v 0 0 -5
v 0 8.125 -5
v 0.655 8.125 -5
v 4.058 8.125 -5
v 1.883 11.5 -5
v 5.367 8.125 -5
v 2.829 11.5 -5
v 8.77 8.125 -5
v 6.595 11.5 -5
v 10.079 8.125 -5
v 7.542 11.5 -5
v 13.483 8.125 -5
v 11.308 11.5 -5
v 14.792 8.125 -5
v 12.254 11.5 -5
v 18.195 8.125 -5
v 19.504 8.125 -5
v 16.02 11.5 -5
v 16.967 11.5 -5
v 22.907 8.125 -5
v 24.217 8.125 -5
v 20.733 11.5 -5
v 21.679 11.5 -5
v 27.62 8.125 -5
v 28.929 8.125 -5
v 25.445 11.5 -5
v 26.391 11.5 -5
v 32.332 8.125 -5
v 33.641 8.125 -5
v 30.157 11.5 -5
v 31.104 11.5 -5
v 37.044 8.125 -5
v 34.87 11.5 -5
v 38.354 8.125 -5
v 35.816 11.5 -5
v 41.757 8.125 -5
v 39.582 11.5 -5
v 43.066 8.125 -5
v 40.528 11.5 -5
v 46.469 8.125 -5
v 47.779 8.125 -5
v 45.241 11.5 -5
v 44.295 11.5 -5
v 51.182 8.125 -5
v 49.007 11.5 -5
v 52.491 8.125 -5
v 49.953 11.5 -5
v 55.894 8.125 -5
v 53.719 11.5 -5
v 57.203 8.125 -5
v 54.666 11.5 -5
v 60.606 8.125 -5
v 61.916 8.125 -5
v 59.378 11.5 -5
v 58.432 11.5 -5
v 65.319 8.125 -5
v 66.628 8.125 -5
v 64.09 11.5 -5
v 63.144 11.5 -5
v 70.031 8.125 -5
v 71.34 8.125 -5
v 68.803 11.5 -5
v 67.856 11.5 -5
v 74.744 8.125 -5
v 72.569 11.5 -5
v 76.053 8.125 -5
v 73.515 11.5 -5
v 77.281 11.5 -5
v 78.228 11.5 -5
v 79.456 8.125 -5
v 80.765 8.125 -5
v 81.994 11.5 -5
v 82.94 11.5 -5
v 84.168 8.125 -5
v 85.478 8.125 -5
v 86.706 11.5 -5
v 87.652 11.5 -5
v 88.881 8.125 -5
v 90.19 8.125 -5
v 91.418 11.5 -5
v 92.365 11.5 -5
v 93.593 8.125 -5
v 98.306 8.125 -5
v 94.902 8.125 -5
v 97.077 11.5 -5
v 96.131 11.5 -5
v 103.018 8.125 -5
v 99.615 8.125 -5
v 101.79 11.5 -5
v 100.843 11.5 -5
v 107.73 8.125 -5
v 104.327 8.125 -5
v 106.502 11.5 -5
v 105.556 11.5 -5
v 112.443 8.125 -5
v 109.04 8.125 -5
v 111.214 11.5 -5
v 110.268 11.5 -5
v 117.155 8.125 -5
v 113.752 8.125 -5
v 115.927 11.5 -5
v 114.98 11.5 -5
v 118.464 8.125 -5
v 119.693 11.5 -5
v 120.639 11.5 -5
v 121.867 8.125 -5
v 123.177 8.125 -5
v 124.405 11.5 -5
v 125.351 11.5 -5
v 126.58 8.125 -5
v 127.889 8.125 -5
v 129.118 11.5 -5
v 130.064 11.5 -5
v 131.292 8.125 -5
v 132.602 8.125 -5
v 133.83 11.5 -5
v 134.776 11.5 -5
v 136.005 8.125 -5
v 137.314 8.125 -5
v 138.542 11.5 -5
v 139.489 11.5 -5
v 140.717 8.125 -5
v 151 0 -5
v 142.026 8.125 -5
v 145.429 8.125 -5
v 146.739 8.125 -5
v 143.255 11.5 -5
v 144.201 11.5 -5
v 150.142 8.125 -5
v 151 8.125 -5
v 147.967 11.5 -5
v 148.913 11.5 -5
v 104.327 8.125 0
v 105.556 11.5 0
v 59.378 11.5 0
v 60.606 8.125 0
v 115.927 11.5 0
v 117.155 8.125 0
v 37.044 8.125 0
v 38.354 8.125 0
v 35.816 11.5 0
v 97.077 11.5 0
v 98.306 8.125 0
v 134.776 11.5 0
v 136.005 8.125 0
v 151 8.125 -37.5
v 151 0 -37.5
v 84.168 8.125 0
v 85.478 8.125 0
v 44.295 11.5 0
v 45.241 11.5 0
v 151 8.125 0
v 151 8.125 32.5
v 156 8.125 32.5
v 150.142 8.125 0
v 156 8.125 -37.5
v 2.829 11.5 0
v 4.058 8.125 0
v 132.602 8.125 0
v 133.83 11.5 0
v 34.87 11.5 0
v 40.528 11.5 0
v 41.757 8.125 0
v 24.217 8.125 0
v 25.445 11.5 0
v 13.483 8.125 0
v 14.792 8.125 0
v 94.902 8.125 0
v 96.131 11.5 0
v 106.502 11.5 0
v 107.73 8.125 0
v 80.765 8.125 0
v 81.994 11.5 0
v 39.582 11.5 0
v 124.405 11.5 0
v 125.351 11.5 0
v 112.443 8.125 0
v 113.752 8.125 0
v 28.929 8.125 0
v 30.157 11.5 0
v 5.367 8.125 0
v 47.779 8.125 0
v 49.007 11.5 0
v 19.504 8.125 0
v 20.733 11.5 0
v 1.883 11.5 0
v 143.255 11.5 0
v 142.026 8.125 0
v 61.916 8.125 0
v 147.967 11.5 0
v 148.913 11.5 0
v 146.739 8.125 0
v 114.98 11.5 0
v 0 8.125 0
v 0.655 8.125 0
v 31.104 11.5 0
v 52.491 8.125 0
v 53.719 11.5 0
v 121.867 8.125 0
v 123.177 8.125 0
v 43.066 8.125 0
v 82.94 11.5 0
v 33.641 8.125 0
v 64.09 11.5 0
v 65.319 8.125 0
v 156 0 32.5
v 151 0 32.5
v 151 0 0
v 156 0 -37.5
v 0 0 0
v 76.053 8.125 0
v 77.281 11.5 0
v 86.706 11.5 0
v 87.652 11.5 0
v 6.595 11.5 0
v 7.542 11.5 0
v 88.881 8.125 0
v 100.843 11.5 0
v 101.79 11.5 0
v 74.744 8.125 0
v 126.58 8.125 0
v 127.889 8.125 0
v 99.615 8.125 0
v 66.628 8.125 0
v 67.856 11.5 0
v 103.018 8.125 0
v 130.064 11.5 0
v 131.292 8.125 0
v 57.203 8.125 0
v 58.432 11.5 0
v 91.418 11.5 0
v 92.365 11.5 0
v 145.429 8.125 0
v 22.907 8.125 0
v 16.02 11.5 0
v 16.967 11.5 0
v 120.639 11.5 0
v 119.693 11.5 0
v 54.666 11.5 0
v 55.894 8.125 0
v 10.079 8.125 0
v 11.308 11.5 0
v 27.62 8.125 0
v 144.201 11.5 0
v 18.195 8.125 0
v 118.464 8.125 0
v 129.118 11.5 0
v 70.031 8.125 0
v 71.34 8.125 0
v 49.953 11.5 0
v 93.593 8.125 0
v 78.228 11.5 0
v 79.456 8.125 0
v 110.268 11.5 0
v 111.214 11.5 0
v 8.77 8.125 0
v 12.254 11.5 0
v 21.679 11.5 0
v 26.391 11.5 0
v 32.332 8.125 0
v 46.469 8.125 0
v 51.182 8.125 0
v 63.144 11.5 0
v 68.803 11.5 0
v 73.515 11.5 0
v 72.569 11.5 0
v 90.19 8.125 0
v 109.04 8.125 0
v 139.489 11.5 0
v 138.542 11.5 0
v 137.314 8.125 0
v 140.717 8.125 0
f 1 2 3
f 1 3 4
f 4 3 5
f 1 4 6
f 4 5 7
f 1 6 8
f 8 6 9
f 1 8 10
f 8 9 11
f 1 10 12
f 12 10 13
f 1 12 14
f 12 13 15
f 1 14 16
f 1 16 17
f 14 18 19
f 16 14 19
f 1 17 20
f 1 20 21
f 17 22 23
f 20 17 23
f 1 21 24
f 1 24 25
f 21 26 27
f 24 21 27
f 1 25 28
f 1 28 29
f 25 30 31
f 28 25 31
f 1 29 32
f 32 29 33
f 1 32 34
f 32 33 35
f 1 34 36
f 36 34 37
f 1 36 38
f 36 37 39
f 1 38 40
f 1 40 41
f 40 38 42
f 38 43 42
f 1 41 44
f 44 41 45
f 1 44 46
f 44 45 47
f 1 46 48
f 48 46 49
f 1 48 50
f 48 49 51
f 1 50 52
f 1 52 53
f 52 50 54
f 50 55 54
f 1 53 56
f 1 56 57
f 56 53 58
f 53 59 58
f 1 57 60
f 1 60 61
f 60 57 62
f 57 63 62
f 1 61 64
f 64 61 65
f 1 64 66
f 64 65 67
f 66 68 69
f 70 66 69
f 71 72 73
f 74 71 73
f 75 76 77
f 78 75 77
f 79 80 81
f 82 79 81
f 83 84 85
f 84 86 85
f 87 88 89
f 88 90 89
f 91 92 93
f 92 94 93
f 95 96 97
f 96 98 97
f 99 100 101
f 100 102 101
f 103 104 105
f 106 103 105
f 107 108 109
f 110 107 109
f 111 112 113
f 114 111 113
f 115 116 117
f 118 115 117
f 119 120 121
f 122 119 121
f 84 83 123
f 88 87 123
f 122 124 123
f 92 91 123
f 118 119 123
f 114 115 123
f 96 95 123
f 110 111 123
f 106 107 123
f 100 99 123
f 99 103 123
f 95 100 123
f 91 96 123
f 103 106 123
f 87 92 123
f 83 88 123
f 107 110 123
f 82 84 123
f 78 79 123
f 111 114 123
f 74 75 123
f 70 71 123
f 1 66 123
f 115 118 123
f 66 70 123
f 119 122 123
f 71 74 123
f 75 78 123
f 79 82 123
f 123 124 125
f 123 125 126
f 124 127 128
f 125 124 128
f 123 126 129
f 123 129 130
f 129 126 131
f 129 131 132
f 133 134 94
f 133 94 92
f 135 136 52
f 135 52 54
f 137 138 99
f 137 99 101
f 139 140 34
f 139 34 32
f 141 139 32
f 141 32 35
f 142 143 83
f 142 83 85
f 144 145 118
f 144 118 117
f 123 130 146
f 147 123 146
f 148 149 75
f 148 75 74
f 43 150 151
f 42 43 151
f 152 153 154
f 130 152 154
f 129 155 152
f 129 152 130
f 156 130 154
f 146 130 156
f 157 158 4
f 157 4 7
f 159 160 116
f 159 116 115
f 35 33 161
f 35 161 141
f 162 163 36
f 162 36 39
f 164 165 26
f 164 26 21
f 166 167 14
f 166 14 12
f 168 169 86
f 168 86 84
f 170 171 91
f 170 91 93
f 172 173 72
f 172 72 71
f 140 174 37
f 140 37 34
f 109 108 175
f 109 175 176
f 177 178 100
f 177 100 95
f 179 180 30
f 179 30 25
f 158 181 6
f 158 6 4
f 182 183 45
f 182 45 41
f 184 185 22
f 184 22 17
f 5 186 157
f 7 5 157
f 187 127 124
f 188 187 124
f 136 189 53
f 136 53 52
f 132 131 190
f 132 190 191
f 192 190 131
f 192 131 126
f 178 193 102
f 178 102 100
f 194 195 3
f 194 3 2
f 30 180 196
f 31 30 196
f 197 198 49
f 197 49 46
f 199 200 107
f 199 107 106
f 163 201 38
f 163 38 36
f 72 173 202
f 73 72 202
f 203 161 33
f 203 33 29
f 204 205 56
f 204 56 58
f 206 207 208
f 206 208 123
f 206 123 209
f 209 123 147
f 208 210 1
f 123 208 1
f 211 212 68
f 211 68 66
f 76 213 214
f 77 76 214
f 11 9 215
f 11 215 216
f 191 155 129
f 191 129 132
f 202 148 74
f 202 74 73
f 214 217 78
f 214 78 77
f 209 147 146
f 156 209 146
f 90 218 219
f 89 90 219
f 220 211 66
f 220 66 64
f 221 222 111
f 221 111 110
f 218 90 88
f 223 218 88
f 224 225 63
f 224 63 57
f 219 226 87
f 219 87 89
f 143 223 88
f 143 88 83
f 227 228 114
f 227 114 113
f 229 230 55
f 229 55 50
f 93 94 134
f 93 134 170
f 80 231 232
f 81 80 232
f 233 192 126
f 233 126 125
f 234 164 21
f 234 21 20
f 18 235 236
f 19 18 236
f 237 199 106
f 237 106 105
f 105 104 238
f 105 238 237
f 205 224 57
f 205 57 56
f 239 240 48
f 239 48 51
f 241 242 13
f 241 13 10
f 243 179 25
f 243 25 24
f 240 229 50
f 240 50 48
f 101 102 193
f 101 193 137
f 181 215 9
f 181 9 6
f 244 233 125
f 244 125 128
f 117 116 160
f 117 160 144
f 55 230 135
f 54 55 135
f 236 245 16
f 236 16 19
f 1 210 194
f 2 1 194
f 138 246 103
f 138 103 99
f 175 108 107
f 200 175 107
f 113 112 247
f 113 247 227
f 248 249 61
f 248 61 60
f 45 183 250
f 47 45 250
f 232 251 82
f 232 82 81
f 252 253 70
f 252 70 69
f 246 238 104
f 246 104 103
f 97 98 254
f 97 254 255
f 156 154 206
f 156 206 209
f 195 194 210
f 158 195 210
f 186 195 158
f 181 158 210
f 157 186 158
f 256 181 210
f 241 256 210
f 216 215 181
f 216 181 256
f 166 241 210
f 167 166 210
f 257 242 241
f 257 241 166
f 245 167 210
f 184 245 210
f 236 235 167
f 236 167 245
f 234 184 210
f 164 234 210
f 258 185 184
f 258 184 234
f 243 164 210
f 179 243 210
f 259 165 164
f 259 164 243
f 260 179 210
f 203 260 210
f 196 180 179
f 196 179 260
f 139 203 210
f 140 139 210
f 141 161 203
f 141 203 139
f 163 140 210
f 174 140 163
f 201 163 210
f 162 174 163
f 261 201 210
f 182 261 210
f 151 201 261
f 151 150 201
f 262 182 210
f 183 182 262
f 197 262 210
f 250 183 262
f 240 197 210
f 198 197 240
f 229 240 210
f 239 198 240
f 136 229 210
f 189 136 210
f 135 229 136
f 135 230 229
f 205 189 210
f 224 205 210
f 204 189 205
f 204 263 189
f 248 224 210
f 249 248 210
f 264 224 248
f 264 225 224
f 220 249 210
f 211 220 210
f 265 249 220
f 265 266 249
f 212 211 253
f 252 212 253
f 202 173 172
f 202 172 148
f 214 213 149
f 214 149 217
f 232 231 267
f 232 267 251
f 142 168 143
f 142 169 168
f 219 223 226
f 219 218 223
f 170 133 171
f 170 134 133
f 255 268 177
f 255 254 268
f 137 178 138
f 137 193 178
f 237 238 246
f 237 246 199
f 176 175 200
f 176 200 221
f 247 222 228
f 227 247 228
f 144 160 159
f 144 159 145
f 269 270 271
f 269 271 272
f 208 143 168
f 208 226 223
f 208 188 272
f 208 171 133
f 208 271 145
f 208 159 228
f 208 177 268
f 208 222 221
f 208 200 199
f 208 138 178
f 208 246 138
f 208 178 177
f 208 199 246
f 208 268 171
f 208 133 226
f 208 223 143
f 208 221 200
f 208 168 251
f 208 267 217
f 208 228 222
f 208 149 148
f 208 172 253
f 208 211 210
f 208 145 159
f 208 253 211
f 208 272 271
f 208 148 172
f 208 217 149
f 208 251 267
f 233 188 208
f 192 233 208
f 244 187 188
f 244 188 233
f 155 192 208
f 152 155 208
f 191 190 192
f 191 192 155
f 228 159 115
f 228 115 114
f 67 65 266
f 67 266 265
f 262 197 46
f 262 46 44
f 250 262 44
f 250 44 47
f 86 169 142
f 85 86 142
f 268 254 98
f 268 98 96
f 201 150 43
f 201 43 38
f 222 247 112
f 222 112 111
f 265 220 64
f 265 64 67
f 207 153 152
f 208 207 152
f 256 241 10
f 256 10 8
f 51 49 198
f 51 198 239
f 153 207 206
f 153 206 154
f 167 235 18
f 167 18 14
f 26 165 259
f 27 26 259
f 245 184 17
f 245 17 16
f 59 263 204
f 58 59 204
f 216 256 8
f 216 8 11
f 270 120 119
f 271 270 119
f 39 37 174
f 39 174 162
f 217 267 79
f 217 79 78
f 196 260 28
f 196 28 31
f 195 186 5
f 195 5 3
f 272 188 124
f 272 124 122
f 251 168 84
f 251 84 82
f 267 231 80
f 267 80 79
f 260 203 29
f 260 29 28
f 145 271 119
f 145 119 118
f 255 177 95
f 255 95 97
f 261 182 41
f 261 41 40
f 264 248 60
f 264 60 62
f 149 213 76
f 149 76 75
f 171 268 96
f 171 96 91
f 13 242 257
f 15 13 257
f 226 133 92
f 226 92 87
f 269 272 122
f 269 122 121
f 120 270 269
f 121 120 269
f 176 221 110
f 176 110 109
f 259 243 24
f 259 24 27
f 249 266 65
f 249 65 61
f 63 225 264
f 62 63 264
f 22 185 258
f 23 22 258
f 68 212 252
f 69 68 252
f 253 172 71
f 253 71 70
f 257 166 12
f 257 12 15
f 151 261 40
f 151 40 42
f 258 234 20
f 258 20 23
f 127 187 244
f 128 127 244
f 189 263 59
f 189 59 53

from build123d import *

# Parameters (mm, degrees)
BLANKSKE_W              = 151
BLANKSKE_H              = 11.5
BLANK_DEPTH             = 5
TOOTHCUTSIM_DEPTH       = 152.519800686
TEETHCUTS_COUNT         = 33
TEETHCUTS_PITCH         = 4.712388975
CROQUIS1_W              = 70
CROQUIS1_H              = 8.125
SALIENTE_EXTRUIR1_DEPTH = 5


with BuildPart() as part:
    # BlankSke → Blank (new body)
    with BuildSketch(Plane.XY):
        with Locations((75.5, 5.75)):
            Rectangle(BLANKSKE_W, BLANKSKE_H)
    extrude(amount=-BLANK_DEPTH)

    # TooCutSkeSim → ToothCutSim (cut, through all)
    with BuildSketch(Plane.XY):
        Polygon((0.654653055, 8.125), (-0.654653055, 8.125), (-1.892297439, 11.5254), (1.892297439, 11.5254), align=None)
    toothcutsim = extrude(amount=-TOOTHCUTSIM_DEPTH, mode=Mode.SUBTRACT)

    # TeethCuts: ToothCutSim ×33
    with Locations(*[(i * TEETHCUTS_PITCH, 0, 0) for i in range(1, TEETHCUTS_COUNT)]):
        add(toothcutsim, mode=Mode.SUBTRACT)

    # Croquis1 → Saliente-Extruir1 (add)
    with BuildSketch(Plane(origin=(151, 0, 0), x_dir=(0, 0, -1), z_dir=(1, 0, 0))):
        with Locations((2.5, 4.0625)):
            Rectangle(CROQUIS1_W, CROQUIS1_H)
    extrude(amount=SALIENTE_EXTRUIR1_DEPTH)


solid = part.part
